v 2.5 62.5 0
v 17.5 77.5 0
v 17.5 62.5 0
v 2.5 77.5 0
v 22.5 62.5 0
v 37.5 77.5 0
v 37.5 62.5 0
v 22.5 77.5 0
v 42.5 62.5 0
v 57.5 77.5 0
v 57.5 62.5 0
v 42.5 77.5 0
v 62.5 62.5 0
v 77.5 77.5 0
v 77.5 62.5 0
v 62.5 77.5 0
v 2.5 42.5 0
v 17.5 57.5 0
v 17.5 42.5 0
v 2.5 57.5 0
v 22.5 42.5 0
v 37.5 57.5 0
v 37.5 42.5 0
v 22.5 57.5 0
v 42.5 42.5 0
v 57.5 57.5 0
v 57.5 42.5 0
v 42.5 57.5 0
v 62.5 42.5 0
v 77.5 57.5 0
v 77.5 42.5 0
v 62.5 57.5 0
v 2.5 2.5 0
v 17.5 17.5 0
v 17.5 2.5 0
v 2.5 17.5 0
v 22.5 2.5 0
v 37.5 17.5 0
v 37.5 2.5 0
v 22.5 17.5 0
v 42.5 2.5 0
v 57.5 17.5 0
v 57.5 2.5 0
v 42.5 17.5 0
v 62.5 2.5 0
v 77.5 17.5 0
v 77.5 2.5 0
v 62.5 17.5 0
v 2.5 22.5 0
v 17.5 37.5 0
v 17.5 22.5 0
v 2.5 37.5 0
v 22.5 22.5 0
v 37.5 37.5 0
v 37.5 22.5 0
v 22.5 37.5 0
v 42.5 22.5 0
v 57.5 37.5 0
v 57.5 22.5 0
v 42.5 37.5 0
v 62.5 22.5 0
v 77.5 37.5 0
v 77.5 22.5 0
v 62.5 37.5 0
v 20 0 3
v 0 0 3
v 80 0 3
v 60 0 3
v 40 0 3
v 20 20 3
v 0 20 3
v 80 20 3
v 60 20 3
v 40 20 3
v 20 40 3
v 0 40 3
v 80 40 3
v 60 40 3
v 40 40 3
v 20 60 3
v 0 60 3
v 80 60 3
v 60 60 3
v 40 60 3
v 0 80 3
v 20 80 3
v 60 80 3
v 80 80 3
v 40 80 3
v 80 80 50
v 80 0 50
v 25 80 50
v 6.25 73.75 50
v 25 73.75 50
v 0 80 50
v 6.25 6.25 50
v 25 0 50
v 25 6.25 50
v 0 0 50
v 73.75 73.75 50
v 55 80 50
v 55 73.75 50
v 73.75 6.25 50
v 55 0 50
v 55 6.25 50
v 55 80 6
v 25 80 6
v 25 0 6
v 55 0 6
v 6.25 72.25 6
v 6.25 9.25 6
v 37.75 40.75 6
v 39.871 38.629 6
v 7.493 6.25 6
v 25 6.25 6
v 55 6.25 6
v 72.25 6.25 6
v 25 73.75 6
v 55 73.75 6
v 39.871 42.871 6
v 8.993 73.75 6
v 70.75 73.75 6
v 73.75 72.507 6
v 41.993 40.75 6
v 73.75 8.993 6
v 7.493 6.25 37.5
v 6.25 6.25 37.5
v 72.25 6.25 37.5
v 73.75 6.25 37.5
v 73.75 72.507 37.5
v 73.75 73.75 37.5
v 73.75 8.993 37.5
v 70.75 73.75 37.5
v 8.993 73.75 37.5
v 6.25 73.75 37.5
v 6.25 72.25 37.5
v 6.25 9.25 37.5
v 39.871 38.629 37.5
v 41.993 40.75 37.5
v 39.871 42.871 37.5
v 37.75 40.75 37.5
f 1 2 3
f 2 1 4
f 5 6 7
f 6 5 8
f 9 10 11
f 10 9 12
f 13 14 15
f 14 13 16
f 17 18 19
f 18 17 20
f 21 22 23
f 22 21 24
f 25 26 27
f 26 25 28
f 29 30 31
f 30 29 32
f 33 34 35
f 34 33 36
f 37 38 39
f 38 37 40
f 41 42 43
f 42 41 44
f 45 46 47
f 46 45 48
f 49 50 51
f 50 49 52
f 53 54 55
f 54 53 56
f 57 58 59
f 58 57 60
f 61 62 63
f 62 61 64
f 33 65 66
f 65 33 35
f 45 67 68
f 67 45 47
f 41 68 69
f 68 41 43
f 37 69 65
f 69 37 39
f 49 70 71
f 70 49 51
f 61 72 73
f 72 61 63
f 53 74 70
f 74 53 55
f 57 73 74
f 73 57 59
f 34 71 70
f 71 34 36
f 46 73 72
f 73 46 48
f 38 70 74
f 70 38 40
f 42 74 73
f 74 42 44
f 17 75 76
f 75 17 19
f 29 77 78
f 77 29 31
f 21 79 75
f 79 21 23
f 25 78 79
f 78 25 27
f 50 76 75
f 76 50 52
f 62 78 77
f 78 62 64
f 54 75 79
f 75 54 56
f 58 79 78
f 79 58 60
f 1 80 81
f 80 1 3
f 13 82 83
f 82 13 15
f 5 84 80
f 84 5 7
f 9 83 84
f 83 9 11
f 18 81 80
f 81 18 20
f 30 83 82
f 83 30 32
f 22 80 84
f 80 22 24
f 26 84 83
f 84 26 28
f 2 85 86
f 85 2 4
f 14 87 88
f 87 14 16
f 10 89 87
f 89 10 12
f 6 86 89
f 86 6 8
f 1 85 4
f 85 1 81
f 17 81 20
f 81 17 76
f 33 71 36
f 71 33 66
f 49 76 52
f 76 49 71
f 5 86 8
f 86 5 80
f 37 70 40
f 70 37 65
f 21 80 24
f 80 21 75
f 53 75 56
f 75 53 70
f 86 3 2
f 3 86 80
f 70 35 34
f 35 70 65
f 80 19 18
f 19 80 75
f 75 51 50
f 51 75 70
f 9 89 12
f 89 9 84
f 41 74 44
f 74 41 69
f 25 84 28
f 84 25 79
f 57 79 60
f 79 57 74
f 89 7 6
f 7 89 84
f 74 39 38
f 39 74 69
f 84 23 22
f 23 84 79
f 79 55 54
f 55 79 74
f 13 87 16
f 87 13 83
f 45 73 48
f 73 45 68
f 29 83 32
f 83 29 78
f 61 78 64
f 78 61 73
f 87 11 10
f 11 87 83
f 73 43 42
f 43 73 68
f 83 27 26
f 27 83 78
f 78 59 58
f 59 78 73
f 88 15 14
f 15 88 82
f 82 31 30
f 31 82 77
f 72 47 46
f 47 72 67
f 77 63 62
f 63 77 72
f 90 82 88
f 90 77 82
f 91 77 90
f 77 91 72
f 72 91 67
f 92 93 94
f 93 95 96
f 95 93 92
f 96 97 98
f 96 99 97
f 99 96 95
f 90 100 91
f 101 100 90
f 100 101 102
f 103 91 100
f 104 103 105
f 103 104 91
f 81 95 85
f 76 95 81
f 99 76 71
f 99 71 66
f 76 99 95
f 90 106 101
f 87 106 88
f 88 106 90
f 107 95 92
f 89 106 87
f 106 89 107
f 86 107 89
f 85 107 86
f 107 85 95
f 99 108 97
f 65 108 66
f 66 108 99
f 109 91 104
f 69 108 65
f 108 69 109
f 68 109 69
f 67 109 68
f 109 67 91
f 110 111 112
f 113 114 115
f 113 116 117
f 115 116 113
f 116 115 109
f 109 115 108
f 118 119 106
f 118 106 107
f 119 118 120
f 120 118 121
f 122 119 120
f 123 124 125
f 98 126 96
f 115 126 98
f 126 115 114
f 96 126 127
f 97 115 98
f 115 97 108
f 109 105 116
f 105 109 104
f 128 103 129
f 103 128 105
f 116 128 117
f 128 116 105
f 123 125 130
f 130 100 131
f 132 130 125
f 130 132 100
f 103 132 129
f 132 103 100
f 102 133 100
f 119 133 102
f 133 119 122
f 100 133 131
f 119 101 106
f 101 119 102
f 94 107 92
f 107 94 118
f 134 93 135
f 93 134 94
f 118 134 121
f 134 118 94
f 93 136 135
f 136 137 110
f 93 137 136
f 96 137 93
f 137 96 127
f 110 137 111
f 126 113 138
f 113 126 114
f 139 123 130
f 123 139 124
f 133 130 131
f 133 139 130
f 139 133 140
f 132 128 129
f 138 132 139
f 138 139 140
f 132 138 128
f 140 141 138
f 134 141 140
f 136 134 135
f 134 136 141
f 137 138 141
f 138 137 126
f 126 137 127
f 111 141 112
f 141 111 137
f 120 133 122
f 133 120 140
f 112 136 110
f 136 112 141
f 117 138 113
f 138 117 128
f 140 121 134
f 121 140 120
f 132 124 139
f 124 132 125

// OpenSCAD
// file: ../common.scad
BASE_TILE_SIZE=20;
BASE_WIDTH=5;
PEAK_HEIGHT=3;

function y_up() = [90, 0, 0];
function x_up() = [90, 0, 90];

function min_floor_offset(wall_width) = wall_width + PEAK_HEIGHT;
function tri_mid() = BASE_WIDTH / 2;
function triangle() = [[0, 0],[BASE_WIDTH, 0],[tri_mid(), PEAK_HEIGHT]];
function base_tile_size() = BASE_TILE_SIZE;
function peak_height() = PEAK_HEIGHT;

function isX(direction) = (direction == "x");

module grid(width, depth, direction) {
    length = isX(direction) ? width : depth;
    slot_length = isX(direction) ? depth : width;
    translate_z = isX(direction) ? -slot_length : 0;
    rot = isX(direction) ? y_up() : x_up();

    // This is the total additional slots past the initial one
    total_slots = floor(length / BASE_TILE_SIZE);

    for (i = [0 : total_slots]) {
        offset = -tri_mid() + BASE_TILE_SIZE * i;
        rotate(rot)
        translate([offset, 0, translate_z])
        linear_extrude(height = slot_length)
        polygon(points=triangle());
    }
}

module grid_slots(width, depth) {
    grid(width, depth, "y");
    grid(width, depth, "x");
}

module base_block(width, depth, height, include_grid = true) {
    difference() {
        cube([width, depth, height]);

        if (include_grid) {
            grid_slots(width, depth);
        }
    }
}
// file: ../chip_holder.scad
use <common.scad>

MAX_THUMB_WIDTH = 30;
WAY_DEEP = 100;

module generate_holder(
    tile_columns = 4,
    tile_rows = 2,
    tile_width = 33,
    tile_depth = 33,
    tile_count = 20,
    tile_height = 1.75,
    wall_width = 3,
    box_height = 69,
    box_clearence = 15.75,
    round_to_full_base = true,
    fit_to_box_height = true,
    hollow_bottom = false,
    include_grid = true
) {
    function getSize(count, tile_size) = count * (tile_size + wall_width) + wall_width;
    function roundFullBase(count, tile_size) = (round_to_full_base) ? ceil(getSize(count, tile_size) / base_tile_size()) * base_tile_size() : getSize(count, tile_size);
    function max_height() = box_height - box_clearence;

    slot_height = tile_count * tile_height;
    min_floor_offset = min_floor_offset(wall_width);
    min_height = slot_height + min_floor_offset;
    total_height = (fit_to_box_height) ? max(max_height(), min_height) : min_height;
    inside_height = (hollow_bottom) ? total_height - min_floor_offset : slot_height;
    floor_offset = (fit_to_box_height) ? max_height() - inside_height : min_floor_offset;

    total_width = roundFullBase(tile_columns, tile_width);
    total_depth = roundFullBase(tile_rows, tile_depth);

    row_width = tile_depth * tile_rows;
    col_width = tile_width * tile_columns;
    outside_walls = wall_width * 2;

    col_spread = (tile_columns > 1) ? (total_width - col_width - outside_walls) / (tile_columns - 1) : 0;
    row_spread = (tile_rows > 1) ? (total_depth - row_width - outside_walls) / (tile_rows - 1) : 0;

    function colOffset(i) = (tile_columns == 1) ?
        (total_width - tile_width) / 2 :
        wall_width + ((tile_width + col_spread) * i);
    function rowOffset(i) = (tile_rows == 1) ?
        (total_depth - tile_depth) / 2 :
        wall_width + ((tile_depth + row_spread) * i);

    module tile_slot() {
        translate([0, 0, 0])
        square([tile_width, tile_depth]);
    }

    module thumb_slot_front() {
        width = min(tile_width - (wall_width * 2), MAX_THUMB_WIDTH);
        side_offset = (tile_width - width) / 2;
        translate([side_offset, -WAY_DEEP, 0])
        square([width, WAY_DEEP]);
    }

    module thumb_slot_back() {
        width = min(tile_width - (wall_width * 2), MAX_THUMB_WIDTH);
        side_offset = (tile_width - width) / 2;
        translate([side_offset, tile_depth, 0])
        square([width, WAY_DEEP]);
    }

    module tile_hole(slot_type = "none") {
        box_bottom = floor_offset;
        translate([0, 0, box_bottom])
        linear_extrude(height = inside_height)
        union() {
            tile_slot();
            if (slot_type == "front" || slot_type == "both") {
                thumb_slot_front();
            }

            if (slot_type == "back" || slot_type == "both") {
                thumb_slot_back();
            }
        }
    }

    module tile_holes() {
        for (i = [0 : tile_rows - 1]) {
            for (j = [0 : tile_columns - 1]) {
                slot_type = (tile_rows == 1) ? "both" : (i == 0) ? "front" : (i == tile_rows - 1) ? "back" : "none";
                col_offset = colOffset(j);
                row_offset = rowOffset(i);

                translate([col_offset, row_offset, 0])
                tile_hole(slot_type = slot_type);
            }
        }
    }

    module bottom_x() {
        if (hollow_bottom) {
            for (i = [0 : tile_rows - 1]) {
                for (j = [0 : tile_columns - 1]) {
                    length = sqrt(pow(tile_width, 2) + pow(tile_depth, 2));
                    rot = acos(tile_depth / length);
                    x_height = inside_height - slot_height;
                    z_offset = min_floor_offset(wall_width);

                    col_offset = colOffset(j);
                    row_offset = rowOffset(i);

                    translate([col_offset - wall_width / 2, row_offset + wall_width / 2, z_offset])
                    rotate([0, 0, -rot])
                    cube([wall_width, length + wall_width, x_height]);

                    translate([col_offset + tile_width, row_offset - wall_width / 2, z_offset])
                    rotate([0, 0, rot])
                    cube([wall_width, length + wall_width, x_height]);
                }
            }
        }
    }

    union() {
        difference() {
            base_block(total_width, total_depth, total_height, include_grid = include_grid);
            tile_holes();
        }
        bottom_x();
    }
}
// file: common.scad
WALL_WIDTH = 3;
BOX_HEIGHT = 50;
BOX_CLEARENCE = 0;
HOLLOW_BOTTOM = true;

function wall_width() = WALL_WIDTH;
function box_height() = BOX_HEIGHT;
function box_clearence() = BOX_CLEARENCE;
function hollow_bottom() = HOLLOW_BOTTOM;
// main file
use <common.scad>
use <../chip_holder.scad>

generate_holder(
    tile_columns = 1,
    tile_rows = 1,
    tile_width = 67.5,
    tile_depth = 67.5,
    tile_count = 1,
    tile_height = 12.5,
    wall_width = wall_width(),
    box_height = box_height(),
    box_clearence = box_clearence(),
    rount_to_full_base = true,
    fit_to_box_height = true,
    hollow_bottom = hollow_bottom()
);
